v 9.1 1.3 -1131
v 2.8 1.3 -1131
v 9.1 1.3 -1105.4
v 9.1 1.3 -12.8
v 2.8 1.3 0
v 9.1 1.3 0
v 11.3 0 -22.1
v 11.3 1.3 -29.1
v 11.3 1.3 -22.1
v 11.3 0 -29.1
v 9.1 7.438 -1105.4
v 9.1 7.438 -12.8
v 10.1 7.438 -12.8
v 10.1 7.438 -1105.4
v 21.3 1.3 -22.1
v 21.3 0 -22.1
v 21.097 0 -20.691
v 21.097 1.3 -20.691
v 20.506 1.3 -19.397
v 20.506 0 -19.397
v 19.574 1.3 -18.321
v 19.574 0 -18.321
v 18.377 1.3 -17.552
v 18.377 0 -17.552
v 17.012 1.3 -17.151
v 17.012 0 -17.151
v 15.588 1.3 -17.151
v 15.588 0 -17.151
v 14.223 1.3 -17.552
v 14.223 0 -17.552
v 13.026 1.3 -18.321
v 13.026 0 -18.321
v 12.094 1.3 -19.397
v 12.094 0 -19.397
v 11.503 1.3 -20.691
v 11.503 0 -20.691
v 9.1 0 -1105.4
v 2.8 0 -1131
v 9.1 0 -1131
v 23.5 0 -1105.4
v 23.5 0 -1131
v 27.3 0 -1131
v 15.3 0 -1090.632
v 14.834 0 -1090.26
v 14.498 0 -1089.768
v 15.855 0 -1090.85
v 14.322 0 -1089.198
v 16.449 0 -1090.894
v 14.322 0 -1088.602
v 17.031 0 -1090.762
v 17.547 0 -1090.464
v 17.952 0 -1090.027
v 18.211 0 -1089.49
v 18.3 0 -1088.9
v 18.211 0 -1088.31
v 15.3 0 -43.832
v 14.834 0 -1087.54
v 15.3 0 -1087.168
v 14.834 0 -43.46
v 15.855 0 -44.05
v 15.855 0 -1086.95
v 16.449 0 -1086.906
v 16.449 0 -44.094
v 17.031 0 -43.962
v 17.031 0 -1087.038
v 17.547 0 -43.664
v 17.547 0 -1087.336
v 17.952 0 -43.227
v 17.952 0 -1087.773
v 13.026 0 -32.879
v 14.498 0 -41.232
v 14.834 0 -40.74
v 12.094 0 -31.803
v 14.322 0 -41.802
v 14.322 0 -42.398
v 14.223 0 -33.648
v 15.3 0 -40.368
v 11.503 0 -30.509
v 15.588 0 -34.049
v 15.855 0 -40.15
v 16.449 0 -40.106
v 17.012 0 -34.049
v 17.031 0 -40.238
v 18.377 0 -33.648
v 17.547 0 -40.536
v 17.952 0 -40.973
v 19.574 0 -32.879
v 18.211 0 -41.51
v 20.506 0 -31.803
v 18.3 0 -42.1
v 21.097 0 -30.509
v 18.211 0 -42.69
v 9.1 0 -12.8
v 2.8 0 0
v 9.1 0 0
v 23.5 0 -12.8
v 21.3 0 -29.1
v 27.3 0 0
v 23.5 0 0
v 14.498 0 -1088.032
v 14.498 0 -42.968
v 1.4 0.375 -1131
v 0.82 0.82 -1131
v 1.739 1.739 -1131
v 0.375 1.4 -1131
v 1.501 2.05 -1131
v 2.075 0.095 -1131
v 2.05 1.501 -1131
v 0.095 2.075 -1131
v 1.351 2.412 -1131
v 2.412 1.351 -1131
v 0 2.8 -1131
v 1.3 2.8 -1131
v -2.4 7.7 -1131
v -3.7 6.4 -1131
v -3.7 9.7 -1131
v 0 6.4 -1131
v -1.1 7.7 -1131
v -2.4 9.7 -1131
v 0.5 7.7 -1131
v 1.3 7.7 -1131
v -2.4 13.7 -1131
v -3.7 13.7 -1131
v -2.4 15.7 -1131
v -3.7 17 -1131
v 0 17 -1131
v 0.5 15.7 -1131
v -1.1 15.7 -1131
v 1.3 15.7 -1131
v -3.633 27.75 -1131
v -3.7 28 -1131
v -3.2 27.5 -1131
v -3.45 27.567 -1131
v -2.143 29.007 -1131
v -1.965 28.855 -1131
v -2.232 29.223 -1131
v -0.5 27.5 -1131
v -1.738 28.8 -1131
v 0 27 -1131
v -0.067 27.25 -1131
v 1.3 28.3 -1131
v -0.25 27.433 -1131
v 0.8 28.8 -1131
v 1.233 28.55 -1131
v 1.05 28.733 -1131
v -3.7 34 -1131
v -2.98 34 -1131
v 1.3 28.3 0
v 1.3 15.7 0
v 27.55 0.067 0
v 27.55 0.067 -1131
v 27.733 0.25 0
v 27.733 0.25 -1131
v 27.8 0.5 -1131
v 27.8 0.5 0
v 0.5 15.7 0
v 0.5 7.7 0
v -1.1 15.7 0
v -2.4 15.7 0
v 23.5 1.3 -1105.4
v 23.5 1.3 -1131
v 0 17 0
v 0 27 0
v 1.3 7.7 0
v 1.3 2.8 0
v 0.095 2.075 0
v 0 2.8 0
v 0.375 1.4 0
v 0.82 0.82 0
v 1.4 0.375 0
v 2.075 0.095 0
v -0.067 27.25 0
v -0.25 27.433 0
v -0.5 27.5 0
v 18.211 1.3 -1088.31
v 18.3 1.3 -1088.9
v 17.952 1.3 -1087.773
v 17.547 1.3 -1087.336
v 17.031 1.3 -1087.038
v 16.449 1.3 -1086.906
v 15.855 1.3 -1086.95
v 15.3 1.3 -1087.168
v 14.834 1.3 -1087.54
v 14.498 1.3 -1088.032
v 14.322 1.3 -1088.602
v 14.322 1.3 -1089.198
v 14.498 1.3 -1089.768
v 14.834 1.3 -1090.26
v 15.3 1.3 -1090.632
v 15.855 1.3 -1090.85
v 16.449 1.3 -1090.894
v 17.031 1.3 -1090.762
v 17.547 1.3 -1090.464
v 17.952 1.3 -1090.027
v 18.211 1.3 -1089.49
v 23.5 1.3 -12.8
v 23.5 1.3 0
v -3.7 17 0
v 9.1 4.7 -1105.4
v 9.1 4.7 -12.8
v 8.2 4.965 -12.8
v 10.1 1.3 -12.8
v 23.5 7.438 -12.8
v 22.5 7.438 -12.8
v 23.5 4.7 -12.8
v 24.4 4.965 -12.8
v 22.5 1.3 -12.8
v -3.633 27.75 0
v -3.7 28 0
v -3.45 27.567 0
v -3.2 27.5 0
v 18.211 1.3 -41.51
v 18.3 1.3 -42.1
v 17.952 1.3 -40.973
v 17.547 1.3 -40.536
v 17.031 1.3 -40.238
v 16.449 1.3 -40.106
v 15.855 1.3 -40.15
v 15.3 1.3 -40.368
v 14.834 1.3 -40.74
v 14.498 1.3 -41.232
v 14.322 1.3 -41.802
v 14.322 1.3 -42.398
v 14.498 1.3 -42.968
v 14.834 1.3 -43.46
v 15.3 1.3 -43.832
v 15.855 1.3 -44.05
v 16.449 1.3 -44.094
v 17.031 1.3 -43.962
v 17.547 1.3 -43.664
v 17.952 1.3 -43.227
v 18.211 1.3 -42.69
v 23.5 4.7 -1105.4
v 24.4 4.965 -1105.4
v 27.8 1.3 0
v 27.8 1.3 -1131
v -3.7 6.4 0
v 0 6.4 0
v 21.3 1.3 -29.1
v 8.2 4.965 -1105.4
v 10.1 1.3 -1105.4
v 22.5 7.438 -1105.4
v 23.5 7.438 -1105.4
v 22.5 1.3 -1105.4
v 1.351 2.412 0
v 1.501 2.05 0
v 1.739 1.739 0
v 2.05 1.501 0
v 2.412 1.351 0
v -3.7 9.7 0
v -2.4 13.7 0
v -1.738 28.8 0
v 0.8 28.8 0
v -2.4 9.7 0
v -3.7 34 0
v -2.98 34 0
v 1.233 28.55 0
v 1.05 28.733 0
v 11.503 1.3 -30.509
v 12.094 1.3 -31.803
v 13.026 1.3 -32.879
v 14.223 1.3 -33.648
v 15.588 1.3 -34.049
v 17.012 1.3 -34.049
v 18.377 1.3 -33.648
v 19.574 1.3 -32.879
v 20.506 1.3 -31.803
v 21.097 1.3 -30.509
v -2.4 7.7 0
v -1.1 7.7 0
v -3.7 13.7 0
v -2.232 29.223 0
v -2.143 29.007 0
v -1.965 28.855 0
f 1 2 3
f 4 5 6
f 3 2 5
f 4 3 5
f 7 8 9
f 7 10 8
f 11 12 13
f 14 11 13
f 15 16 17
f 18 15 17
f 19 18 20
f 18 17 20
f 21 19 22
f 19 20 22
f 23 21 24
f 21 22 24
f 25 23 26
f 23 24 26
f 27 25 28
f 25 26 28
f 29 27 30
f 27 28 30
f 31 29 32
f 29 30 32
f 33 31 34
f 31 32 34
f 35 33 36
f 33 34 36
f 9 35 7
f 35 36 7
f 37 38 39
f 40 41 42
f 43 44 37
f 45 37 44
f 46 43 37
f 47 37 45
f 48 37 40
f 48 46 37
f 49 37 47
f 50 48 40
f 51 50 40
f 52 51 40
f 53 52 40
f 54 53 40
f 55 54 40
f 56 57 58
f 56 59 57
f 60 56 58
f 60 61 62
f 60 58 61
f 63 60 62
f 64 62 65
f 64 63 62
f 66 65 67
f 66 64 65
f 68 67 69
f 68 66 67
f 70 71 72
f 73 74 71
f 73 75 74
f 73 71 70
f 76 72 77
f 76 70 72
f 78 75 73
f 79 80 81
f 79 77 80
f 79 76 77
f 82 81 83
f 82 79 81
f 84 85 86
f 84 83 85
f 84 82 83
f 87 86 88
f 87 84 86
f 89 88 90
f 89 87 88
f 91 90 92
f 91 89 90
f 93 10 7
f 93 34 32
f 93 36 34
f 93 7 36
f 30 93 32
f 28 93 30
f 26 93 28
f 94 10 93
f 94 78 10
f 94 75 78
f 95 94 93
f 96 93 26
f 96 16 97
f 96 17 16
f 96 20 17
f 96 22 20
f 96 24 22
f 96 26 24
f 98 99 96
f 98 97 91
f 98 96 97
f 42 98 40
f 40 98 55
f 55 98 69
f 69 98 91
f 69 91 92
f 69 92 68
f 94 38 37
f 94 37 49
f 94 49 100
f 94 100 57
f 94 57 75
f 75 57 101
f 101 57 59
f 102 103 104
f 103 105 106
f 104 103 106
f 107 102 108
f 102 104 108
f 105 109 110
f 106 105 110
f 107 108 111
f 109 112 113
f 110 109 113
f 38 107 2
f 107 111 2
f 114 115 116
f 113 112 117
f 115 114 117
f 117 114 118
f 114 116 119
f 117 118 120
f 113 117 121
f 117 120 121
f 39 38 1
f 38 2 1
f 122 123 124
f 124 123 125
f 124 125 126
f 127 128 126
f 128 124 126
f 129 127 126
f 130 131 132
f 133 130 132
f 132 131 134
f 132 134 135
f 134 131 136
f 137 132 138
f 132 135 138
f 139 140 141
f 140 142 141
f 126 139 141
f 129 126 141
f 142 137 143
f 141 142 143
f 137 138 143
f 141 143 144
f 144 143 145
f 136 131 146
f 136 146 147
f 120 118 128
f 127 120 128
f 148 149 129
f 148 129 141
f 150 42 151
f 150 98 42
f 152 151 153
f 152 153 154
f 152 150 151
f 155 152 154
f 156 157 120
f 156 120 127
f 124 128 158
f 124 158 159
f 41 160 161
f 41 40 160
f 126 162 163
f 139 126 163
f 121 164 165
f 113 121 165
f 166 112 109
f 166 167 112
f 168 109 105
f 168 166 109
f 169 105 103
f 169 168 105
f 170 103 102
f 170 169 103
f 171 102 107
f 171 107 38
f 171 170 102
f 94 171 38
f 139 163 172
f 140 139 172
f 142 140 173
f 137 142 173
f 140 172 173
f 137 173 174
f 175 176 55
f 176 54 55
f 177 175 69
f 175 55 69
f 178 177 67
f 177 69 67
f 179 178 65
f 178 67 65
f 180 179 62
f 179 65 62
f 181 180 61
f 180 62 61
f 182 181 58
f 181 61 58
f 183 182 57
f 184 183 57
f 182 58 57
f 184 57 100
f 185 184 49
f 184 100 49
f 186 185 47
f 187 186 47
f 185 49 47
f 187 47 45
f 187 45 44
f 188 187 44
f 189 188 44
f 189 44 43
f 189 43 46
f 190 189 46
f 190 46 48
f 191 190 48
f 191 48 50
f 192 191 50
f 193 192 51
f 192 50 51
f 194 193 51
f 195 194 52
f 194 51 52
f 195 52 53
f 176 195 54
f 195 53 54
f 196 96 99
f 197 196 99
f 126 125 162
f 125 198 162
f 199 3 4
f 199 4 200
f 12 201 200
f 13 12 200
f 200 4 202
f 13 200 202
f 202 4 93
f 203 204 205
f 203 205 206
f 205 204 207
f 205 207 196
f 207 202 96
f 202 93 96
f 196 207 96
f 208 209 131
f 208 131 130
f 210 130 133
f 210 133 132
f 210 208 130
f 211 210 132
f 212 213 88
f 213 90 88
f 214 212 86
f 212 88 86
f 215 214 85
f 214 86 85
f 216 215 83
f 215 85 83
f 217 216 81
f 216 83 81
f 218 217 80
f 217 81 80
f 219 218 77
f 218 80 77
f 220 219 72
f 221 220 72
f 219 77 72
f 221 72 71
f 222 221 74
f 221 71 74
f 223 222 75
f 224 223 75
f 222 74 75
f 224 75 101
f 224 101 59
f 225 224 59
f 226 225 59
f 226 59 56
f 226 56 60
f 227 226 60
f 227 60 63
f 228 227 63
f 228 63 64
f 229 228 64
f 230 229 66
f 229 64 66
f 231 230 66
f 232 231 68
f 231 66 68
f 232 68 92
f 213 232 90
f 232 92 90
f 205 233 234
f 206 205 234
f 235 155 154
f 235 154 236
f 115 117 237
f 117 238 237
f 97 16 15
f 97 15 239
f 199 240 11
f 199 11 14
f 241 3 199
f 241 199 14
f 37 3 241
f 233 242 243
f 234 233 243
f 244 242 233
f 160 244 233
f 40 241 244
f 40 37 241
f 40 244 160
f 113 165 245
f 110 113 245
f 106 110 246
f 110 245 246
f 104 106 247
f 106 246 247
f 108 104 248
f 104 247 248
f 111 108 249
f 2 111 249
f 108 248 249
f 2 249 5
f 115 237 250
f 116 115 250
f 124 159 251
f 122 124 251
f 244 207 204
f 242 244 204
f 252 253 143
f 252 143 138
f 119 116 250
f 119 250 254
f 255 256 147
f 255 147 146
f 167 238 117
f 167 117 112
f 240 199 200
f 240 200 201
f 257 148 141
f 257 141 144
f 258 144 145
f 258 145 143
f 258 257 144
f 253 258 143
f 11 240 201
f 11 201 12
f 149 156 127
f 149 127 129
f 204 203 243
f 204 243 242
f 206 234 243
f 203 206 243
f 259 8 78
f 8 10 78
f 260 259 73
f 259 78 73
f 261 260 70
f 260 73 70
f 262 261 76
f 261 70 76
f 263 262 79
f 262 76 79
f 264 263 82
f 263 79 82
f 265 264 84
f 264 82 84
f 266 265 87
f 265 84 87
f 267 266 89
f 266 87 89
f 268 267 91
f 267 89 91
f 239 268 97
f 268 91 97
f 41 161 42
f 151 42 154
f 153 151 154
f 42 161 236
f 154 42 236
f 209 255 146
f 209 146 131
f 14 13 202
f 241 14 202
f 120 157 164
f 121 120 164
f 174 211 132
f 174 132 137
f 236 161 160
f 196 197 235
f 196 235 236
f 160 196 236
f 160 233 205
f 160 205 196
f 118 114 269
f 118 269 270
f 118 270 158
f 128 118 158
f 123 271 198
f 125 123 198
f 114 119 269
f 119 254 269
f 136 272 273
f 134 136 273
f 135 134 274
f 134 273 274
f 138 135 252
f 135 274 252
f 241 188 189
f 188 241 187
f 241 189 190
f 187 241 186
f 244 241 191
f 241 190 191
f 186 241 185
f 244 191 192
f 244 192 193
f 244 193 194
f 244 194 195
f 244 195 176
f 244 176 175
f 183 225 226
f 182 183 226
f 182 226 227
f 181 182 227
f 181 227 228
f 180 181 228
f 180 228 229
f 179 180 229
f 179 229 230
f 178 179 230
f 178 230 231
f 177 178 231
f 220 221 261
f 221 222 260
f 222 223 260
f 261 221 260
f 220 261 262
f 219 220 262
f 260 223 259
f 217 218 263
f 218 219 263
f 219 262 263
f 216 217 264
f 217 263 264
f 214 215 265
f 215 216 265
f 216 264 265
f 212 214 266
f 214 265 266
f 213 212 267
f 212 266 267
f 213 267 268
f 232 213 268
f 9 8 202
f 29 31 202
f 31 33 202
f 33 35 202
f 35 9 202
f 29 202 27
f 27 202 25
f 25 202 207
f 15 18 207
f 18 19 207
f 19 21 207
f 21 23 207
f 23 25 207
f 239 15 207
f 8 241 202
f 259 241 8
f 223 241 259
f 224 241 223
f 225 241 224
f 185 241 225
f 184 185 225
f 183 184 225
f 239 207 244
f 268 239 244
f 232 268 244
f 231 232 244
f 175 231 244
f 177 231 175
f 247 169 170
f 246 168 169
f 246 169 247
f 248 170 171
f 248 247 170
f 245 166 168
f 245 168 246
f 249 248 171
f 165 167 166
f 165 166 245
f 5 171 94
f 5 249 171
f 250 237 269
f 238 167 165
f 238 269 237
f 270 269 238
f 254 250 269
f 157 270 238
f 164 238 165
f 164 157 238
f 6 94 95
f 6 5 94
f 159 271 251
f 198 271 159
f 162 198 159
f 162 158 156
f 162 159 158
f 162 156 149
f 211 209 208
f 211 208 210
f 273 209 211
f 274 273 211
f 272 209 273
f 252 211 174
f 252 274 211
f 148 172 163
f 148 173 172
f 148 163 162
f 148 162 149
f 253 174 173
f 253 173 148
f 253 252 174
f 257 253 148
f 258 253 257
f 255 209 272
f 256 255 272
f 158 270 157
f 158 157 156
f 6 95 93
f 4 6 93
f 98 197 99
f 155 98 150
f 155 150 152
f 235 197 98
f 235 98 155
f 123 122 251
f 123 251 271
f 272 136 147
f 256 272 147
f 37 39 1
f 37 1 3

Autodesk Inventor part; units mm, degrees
ref_plane "YZ Plane" through (0, 0, 0) normal (1, 0, 0) x (0, 1, 0)
sketch "Boceto1" plane through (0, 0, 0) normal (0, 0, 1) x (1, 0, 0)
  line L0 (2.8, 0) -> (27.3, 0)
  line L1 (27.8, 0.5) -> (27.8, 1.3)
  line L2 (0.5, 7.7) -> (1.3, 7.7)
  line L3 (0.5, 7.7) -> (0.5, 15.7)
  line L4 (0.5, 15.7) -> (1.3, 15.7)
  line L5 (1.3, 15.7) -> (1.3, 28.3)
  line L6 (0, 6.4) -> (-3.7, 6.4)
  line L7 (-3.7, 6.4) -> (-3.7, 9.7)
  line L8 (-3.7, 9.7) -> (-2.4, 9.7)
  line L9 (-2.4, 9.7) -> (-2.4, 7.7)
  line L10 (-2.4, 7.7) -> (-1.1, 7.7)
  line L11 (-1.1, 7.7) -> (-1.1, 15.7)
  line L12 (-1.1, 15.7) -> (-2.4, 15.7)
  line L13 (-2.4, 15.7) -> (-2.4, 13.7)
  line L14 (-2.4, 13.7) -> (-3.7, 13.7)
  line L15 (-3.7, 13.7) -> (-3.7, 17)
  line L16 (-3.7, 17) -> (0, 17)
  line L17 (0, 17) -> (0, 27)
  line L18 (0, 6.4) -> (0, 2.8)
  line L19 (0.8, 28.8) -> (-1.7379, 28.8)
  line L20 (-2.2319, 29.2226) -> (-2.98, 34)
  line L21 (-2.98, 34) -> (-3.7, 34)
  line L22 (-3.7, 34) -> (-3.7, 28)
  line L23 (-3.2, 27.5) -> (-0.5, 27.5)
  line L24 (1.3, 7.7) -> (1.3, 2.8)
  line L25 (9.1, 1.3) -> (9.1, 4.7)
  line L26 (10.1, 7.4376) -> (10.1, 1.3)
  line L27 (22.5, 1.3) -> (22.5, 7.4376)
  line L28 (23.5, 4.7) -> (23.5, 1.3)
  line L29 (23.5, 1.3) -> (27.8, 1.3)
  line L30 (2.8, 1.3) -> (9.1, 1.3)
  line L31 (10.1, 1.3) -> (22.5, 1.3)
  arc A0 (0, 2.8) -> (2.8, 0) centre (2.8, 2.8) ccw
  arc A1 (27.3, 0) -> (27.8, 0.5) centre (27.3, 0.5) ccw
  arc A2 (0, 27) -> (-0.5, 27.5) centre (-0.5, 27) ccw
  arc A3 (-3.7, 28) -> (-3.2, 27.5) centre (-3.2, 28) ccw
  arc A4 (1.3, 28.3) -> (0.8, 28.8) centre (0.8, 28.3) ccw
  arc A5 (-2.2319, 29.2226) -> (-1.7379, 28.8) centre (-1.7379, 29.3) ccw
  arc A6 (1.3, 2.8) -> (2.8, 1.3) centre (2.8, 2.8) ccw
  line L32 (23.5, 4.7) -> (24.4, 4.9649)
  line L33 (24.4, 4.9649) -> (23.5, 7.4376)
  line L34 (9.1, 4.7) -> (8.2, 4.9649)
  line L35 (8.2, 4.9649) -> (9.1, 7.4376)
  line L36 (23.5, 10.0894) -> (23.5, -1.1197) construction
  line L37 (23.5, 7.4376) -> (22.5, 7.4376)
  line L38 (9.1, 10.0894) -> (9.1, -1.1197) construction
  line L39 (9.1, 7.4376) -> (10.1, 7.4376)
  point P0 (0, 0)
  point P1 (-1.1, 11.7)
  dimension "d3" = 1.3
  dimension "d4" = 1.3
  dimension "d6" = 1.3
  dimension "d7" = 1.3
  dimension "d9" = 1.3
  dimension "d10" = 1.3
  dimension "d11" = 1.3
  dimension "d15" = 34
  dimension "d16" = 31.5
  dimension "d44" = 6.4
  dimension "d45" = 4
  dimension "d46" = 8
  dimension "d47" = 2
  dimension "d48" = 10.6
  dimension "d49" = 1.3
  dimension "d51" = 0.8
  dimension "d52" = 0.8
  dimension "d53" = 6.5
  dimension "d57" = 98.9
  dimension "d58" = 0.72
  dimension "d60" = 1.6
  dimension "d61" = 2.8
  dimension "d63" = 0.5
  dimension "d64" = 0.5
  dimension "d65" = 31.5
  dimension "d70" = 1.5
  dimension "d71" = 1.3
  dimension "d77" = 3.4
  dimension "d78" = 3.4
  dimension "d80" = 4.3
  dimension "d83" = 16.4
  dimension "d86" = 0.9
  dimension "d87" = 16.4
  dimension "d92" = 70
  dimension "d94" = 1
  dimension "d95" = 0.9
  dimension "d96" = 1
  dimension "d97" = 70
  dimension "d98" = 14.4
  dimension "d99" = 7.8
  dimension "d108" = 2.9
extrude "Extrusión1" add sketch "Boceto1" against normal blind 1131
sketch "Boceto4" plane through (2.8, 0, 0) normal (0, -1, 0) x (1, 0, 0)
  line L0 (0, 0) -> (24.5, 0) projected
  line L1 (20.7, 0) -> (6.3, 0)
  line L2 (6.3, 0) -> (6.3, -12.8)
  line L3 (6.3, -12.8) -> (20.7, -12.8)
  line L4 (20.7, -12.8) -> (20.7, 0)
  line L5 (24.5, 0) -> (24.5, -1131) projected
  line L6 (0, 0) -> (0, -1131) projected
  line L7 (13.5, -22.1) -> (13.5, -29.1) construction
  line L8 (18.5, -22.1) -> (18.5, -29.1)
  line L9 (8.5, -29.1) -> (8.5, -22.1)
  arc A0 (18.5, -22.1) -> (8.5, -22.1) centre (13.5, -22.1) ccw
  arc A1 (8.5, -29.1) -> (18.5, -29.1) centre (13.5, -29.1) ccw
  circle A2 centre (13.5, -42.1) radius 2
  line L10 (13.5, -9.0915) -> (13.5, -53.7508) construction
  line L11 (25, 0) -> (25, -1131) projected
  line L12 (20.7, -1131) -> (6.3, -1131)
  line L13 (6.3, -1131) -> (6.3, -1105.4)
  line L14 (6.3, -1105.4) -> (20.7, -1105.4)
  line L15 (20.7, -1105.4) -> (20.7, -1131)
  line L16 (24.5, -1131) -> (0, -1131) projected
  circle A3 centre (13.5, -1088.9) radius 2
  point P0 (-2.8, 0)
  point P1 (13.5, -25.6)
  point P2 (13.5, -34.1)
  point P3 (13.5, -17.1)
  point P4 (13.5, -12.8)
  dimension "d109" = 12.8
  dimension "d114" = 10
  dimension "d115" = 17
  dimension "d118" = 4.3
  dimension "d121" = 4
  dimension "d125" = 14.4
  dimension "d126" = 4.3
  dimension "d127" = 8
  dimension "d131" = 4.3
  dimension "d132" = 14.4
  dimension "d133" = 25.6
  dimension "d134" = 4
  dimension "d135" = 16.5
  dimension "d136" = 11.5
extrude "Extrusión4" cut sketch "Boceto4" against normal through all contours L0 L4 L3 L2 | L13 L14 L15 L12 | L8 A1 L9 A0 | A2 | A3
ref_plane "Plano de trabajo3" through (0, 0, 0) normal (0, 0, 1) x (1, 0, 0)
sketch "Boceto5" plane through (0, 0, 0) normal (0, 0, 1) x (1, 0, 0)
  line L0 (24.4, 1.8205) -> (8.0624, 1.8205)
  line L1 (8.0624, 1.8205) -> (8.0624, 8.2042)
  line L2 (8.0624, 8.2042) -> (24.4, 8.2042)
  line L3 (24.4, 8.2042) -> (24.4, 1.8205)
  point P0 (0, 0)
extrude "Extrusión5" cut sketch "Boceto5" against normal up to surface (12.8 mm away)
ref_plane "Plano de trabajo4" through (0, 0, -1131) normal (0, 0, -1) x (-1, 0, 0)
sketch "Boceto6" plane through (0, 0, -1131) normal (0, 0, -1) x (-1, 0, 0)
  line L0 (-9.1, 1.3) -> (-2.8, 1.3) projected
  line L1 (-7.3903, 1.3) -> (-24.6588, 1.3)
  line L2 (-24.6588, 1.3) -> (-24.6588, 8.0245)
  line L3 (-24.6588, 8.0245) -> (-7.3903, 8.0245)
  line L4 (-7.3903, 8.0245) -> (-7.3903, 1.3)
  point P0 (0, 0)
extrude "Extrusión6" cut sketch "Boceto6" against normal up to surface (25.6 mm away)
properties part number "SP40-11 TAPETA - ENCUENTRO HOJA CORREDERA 695 mm" material "Aluminio"
